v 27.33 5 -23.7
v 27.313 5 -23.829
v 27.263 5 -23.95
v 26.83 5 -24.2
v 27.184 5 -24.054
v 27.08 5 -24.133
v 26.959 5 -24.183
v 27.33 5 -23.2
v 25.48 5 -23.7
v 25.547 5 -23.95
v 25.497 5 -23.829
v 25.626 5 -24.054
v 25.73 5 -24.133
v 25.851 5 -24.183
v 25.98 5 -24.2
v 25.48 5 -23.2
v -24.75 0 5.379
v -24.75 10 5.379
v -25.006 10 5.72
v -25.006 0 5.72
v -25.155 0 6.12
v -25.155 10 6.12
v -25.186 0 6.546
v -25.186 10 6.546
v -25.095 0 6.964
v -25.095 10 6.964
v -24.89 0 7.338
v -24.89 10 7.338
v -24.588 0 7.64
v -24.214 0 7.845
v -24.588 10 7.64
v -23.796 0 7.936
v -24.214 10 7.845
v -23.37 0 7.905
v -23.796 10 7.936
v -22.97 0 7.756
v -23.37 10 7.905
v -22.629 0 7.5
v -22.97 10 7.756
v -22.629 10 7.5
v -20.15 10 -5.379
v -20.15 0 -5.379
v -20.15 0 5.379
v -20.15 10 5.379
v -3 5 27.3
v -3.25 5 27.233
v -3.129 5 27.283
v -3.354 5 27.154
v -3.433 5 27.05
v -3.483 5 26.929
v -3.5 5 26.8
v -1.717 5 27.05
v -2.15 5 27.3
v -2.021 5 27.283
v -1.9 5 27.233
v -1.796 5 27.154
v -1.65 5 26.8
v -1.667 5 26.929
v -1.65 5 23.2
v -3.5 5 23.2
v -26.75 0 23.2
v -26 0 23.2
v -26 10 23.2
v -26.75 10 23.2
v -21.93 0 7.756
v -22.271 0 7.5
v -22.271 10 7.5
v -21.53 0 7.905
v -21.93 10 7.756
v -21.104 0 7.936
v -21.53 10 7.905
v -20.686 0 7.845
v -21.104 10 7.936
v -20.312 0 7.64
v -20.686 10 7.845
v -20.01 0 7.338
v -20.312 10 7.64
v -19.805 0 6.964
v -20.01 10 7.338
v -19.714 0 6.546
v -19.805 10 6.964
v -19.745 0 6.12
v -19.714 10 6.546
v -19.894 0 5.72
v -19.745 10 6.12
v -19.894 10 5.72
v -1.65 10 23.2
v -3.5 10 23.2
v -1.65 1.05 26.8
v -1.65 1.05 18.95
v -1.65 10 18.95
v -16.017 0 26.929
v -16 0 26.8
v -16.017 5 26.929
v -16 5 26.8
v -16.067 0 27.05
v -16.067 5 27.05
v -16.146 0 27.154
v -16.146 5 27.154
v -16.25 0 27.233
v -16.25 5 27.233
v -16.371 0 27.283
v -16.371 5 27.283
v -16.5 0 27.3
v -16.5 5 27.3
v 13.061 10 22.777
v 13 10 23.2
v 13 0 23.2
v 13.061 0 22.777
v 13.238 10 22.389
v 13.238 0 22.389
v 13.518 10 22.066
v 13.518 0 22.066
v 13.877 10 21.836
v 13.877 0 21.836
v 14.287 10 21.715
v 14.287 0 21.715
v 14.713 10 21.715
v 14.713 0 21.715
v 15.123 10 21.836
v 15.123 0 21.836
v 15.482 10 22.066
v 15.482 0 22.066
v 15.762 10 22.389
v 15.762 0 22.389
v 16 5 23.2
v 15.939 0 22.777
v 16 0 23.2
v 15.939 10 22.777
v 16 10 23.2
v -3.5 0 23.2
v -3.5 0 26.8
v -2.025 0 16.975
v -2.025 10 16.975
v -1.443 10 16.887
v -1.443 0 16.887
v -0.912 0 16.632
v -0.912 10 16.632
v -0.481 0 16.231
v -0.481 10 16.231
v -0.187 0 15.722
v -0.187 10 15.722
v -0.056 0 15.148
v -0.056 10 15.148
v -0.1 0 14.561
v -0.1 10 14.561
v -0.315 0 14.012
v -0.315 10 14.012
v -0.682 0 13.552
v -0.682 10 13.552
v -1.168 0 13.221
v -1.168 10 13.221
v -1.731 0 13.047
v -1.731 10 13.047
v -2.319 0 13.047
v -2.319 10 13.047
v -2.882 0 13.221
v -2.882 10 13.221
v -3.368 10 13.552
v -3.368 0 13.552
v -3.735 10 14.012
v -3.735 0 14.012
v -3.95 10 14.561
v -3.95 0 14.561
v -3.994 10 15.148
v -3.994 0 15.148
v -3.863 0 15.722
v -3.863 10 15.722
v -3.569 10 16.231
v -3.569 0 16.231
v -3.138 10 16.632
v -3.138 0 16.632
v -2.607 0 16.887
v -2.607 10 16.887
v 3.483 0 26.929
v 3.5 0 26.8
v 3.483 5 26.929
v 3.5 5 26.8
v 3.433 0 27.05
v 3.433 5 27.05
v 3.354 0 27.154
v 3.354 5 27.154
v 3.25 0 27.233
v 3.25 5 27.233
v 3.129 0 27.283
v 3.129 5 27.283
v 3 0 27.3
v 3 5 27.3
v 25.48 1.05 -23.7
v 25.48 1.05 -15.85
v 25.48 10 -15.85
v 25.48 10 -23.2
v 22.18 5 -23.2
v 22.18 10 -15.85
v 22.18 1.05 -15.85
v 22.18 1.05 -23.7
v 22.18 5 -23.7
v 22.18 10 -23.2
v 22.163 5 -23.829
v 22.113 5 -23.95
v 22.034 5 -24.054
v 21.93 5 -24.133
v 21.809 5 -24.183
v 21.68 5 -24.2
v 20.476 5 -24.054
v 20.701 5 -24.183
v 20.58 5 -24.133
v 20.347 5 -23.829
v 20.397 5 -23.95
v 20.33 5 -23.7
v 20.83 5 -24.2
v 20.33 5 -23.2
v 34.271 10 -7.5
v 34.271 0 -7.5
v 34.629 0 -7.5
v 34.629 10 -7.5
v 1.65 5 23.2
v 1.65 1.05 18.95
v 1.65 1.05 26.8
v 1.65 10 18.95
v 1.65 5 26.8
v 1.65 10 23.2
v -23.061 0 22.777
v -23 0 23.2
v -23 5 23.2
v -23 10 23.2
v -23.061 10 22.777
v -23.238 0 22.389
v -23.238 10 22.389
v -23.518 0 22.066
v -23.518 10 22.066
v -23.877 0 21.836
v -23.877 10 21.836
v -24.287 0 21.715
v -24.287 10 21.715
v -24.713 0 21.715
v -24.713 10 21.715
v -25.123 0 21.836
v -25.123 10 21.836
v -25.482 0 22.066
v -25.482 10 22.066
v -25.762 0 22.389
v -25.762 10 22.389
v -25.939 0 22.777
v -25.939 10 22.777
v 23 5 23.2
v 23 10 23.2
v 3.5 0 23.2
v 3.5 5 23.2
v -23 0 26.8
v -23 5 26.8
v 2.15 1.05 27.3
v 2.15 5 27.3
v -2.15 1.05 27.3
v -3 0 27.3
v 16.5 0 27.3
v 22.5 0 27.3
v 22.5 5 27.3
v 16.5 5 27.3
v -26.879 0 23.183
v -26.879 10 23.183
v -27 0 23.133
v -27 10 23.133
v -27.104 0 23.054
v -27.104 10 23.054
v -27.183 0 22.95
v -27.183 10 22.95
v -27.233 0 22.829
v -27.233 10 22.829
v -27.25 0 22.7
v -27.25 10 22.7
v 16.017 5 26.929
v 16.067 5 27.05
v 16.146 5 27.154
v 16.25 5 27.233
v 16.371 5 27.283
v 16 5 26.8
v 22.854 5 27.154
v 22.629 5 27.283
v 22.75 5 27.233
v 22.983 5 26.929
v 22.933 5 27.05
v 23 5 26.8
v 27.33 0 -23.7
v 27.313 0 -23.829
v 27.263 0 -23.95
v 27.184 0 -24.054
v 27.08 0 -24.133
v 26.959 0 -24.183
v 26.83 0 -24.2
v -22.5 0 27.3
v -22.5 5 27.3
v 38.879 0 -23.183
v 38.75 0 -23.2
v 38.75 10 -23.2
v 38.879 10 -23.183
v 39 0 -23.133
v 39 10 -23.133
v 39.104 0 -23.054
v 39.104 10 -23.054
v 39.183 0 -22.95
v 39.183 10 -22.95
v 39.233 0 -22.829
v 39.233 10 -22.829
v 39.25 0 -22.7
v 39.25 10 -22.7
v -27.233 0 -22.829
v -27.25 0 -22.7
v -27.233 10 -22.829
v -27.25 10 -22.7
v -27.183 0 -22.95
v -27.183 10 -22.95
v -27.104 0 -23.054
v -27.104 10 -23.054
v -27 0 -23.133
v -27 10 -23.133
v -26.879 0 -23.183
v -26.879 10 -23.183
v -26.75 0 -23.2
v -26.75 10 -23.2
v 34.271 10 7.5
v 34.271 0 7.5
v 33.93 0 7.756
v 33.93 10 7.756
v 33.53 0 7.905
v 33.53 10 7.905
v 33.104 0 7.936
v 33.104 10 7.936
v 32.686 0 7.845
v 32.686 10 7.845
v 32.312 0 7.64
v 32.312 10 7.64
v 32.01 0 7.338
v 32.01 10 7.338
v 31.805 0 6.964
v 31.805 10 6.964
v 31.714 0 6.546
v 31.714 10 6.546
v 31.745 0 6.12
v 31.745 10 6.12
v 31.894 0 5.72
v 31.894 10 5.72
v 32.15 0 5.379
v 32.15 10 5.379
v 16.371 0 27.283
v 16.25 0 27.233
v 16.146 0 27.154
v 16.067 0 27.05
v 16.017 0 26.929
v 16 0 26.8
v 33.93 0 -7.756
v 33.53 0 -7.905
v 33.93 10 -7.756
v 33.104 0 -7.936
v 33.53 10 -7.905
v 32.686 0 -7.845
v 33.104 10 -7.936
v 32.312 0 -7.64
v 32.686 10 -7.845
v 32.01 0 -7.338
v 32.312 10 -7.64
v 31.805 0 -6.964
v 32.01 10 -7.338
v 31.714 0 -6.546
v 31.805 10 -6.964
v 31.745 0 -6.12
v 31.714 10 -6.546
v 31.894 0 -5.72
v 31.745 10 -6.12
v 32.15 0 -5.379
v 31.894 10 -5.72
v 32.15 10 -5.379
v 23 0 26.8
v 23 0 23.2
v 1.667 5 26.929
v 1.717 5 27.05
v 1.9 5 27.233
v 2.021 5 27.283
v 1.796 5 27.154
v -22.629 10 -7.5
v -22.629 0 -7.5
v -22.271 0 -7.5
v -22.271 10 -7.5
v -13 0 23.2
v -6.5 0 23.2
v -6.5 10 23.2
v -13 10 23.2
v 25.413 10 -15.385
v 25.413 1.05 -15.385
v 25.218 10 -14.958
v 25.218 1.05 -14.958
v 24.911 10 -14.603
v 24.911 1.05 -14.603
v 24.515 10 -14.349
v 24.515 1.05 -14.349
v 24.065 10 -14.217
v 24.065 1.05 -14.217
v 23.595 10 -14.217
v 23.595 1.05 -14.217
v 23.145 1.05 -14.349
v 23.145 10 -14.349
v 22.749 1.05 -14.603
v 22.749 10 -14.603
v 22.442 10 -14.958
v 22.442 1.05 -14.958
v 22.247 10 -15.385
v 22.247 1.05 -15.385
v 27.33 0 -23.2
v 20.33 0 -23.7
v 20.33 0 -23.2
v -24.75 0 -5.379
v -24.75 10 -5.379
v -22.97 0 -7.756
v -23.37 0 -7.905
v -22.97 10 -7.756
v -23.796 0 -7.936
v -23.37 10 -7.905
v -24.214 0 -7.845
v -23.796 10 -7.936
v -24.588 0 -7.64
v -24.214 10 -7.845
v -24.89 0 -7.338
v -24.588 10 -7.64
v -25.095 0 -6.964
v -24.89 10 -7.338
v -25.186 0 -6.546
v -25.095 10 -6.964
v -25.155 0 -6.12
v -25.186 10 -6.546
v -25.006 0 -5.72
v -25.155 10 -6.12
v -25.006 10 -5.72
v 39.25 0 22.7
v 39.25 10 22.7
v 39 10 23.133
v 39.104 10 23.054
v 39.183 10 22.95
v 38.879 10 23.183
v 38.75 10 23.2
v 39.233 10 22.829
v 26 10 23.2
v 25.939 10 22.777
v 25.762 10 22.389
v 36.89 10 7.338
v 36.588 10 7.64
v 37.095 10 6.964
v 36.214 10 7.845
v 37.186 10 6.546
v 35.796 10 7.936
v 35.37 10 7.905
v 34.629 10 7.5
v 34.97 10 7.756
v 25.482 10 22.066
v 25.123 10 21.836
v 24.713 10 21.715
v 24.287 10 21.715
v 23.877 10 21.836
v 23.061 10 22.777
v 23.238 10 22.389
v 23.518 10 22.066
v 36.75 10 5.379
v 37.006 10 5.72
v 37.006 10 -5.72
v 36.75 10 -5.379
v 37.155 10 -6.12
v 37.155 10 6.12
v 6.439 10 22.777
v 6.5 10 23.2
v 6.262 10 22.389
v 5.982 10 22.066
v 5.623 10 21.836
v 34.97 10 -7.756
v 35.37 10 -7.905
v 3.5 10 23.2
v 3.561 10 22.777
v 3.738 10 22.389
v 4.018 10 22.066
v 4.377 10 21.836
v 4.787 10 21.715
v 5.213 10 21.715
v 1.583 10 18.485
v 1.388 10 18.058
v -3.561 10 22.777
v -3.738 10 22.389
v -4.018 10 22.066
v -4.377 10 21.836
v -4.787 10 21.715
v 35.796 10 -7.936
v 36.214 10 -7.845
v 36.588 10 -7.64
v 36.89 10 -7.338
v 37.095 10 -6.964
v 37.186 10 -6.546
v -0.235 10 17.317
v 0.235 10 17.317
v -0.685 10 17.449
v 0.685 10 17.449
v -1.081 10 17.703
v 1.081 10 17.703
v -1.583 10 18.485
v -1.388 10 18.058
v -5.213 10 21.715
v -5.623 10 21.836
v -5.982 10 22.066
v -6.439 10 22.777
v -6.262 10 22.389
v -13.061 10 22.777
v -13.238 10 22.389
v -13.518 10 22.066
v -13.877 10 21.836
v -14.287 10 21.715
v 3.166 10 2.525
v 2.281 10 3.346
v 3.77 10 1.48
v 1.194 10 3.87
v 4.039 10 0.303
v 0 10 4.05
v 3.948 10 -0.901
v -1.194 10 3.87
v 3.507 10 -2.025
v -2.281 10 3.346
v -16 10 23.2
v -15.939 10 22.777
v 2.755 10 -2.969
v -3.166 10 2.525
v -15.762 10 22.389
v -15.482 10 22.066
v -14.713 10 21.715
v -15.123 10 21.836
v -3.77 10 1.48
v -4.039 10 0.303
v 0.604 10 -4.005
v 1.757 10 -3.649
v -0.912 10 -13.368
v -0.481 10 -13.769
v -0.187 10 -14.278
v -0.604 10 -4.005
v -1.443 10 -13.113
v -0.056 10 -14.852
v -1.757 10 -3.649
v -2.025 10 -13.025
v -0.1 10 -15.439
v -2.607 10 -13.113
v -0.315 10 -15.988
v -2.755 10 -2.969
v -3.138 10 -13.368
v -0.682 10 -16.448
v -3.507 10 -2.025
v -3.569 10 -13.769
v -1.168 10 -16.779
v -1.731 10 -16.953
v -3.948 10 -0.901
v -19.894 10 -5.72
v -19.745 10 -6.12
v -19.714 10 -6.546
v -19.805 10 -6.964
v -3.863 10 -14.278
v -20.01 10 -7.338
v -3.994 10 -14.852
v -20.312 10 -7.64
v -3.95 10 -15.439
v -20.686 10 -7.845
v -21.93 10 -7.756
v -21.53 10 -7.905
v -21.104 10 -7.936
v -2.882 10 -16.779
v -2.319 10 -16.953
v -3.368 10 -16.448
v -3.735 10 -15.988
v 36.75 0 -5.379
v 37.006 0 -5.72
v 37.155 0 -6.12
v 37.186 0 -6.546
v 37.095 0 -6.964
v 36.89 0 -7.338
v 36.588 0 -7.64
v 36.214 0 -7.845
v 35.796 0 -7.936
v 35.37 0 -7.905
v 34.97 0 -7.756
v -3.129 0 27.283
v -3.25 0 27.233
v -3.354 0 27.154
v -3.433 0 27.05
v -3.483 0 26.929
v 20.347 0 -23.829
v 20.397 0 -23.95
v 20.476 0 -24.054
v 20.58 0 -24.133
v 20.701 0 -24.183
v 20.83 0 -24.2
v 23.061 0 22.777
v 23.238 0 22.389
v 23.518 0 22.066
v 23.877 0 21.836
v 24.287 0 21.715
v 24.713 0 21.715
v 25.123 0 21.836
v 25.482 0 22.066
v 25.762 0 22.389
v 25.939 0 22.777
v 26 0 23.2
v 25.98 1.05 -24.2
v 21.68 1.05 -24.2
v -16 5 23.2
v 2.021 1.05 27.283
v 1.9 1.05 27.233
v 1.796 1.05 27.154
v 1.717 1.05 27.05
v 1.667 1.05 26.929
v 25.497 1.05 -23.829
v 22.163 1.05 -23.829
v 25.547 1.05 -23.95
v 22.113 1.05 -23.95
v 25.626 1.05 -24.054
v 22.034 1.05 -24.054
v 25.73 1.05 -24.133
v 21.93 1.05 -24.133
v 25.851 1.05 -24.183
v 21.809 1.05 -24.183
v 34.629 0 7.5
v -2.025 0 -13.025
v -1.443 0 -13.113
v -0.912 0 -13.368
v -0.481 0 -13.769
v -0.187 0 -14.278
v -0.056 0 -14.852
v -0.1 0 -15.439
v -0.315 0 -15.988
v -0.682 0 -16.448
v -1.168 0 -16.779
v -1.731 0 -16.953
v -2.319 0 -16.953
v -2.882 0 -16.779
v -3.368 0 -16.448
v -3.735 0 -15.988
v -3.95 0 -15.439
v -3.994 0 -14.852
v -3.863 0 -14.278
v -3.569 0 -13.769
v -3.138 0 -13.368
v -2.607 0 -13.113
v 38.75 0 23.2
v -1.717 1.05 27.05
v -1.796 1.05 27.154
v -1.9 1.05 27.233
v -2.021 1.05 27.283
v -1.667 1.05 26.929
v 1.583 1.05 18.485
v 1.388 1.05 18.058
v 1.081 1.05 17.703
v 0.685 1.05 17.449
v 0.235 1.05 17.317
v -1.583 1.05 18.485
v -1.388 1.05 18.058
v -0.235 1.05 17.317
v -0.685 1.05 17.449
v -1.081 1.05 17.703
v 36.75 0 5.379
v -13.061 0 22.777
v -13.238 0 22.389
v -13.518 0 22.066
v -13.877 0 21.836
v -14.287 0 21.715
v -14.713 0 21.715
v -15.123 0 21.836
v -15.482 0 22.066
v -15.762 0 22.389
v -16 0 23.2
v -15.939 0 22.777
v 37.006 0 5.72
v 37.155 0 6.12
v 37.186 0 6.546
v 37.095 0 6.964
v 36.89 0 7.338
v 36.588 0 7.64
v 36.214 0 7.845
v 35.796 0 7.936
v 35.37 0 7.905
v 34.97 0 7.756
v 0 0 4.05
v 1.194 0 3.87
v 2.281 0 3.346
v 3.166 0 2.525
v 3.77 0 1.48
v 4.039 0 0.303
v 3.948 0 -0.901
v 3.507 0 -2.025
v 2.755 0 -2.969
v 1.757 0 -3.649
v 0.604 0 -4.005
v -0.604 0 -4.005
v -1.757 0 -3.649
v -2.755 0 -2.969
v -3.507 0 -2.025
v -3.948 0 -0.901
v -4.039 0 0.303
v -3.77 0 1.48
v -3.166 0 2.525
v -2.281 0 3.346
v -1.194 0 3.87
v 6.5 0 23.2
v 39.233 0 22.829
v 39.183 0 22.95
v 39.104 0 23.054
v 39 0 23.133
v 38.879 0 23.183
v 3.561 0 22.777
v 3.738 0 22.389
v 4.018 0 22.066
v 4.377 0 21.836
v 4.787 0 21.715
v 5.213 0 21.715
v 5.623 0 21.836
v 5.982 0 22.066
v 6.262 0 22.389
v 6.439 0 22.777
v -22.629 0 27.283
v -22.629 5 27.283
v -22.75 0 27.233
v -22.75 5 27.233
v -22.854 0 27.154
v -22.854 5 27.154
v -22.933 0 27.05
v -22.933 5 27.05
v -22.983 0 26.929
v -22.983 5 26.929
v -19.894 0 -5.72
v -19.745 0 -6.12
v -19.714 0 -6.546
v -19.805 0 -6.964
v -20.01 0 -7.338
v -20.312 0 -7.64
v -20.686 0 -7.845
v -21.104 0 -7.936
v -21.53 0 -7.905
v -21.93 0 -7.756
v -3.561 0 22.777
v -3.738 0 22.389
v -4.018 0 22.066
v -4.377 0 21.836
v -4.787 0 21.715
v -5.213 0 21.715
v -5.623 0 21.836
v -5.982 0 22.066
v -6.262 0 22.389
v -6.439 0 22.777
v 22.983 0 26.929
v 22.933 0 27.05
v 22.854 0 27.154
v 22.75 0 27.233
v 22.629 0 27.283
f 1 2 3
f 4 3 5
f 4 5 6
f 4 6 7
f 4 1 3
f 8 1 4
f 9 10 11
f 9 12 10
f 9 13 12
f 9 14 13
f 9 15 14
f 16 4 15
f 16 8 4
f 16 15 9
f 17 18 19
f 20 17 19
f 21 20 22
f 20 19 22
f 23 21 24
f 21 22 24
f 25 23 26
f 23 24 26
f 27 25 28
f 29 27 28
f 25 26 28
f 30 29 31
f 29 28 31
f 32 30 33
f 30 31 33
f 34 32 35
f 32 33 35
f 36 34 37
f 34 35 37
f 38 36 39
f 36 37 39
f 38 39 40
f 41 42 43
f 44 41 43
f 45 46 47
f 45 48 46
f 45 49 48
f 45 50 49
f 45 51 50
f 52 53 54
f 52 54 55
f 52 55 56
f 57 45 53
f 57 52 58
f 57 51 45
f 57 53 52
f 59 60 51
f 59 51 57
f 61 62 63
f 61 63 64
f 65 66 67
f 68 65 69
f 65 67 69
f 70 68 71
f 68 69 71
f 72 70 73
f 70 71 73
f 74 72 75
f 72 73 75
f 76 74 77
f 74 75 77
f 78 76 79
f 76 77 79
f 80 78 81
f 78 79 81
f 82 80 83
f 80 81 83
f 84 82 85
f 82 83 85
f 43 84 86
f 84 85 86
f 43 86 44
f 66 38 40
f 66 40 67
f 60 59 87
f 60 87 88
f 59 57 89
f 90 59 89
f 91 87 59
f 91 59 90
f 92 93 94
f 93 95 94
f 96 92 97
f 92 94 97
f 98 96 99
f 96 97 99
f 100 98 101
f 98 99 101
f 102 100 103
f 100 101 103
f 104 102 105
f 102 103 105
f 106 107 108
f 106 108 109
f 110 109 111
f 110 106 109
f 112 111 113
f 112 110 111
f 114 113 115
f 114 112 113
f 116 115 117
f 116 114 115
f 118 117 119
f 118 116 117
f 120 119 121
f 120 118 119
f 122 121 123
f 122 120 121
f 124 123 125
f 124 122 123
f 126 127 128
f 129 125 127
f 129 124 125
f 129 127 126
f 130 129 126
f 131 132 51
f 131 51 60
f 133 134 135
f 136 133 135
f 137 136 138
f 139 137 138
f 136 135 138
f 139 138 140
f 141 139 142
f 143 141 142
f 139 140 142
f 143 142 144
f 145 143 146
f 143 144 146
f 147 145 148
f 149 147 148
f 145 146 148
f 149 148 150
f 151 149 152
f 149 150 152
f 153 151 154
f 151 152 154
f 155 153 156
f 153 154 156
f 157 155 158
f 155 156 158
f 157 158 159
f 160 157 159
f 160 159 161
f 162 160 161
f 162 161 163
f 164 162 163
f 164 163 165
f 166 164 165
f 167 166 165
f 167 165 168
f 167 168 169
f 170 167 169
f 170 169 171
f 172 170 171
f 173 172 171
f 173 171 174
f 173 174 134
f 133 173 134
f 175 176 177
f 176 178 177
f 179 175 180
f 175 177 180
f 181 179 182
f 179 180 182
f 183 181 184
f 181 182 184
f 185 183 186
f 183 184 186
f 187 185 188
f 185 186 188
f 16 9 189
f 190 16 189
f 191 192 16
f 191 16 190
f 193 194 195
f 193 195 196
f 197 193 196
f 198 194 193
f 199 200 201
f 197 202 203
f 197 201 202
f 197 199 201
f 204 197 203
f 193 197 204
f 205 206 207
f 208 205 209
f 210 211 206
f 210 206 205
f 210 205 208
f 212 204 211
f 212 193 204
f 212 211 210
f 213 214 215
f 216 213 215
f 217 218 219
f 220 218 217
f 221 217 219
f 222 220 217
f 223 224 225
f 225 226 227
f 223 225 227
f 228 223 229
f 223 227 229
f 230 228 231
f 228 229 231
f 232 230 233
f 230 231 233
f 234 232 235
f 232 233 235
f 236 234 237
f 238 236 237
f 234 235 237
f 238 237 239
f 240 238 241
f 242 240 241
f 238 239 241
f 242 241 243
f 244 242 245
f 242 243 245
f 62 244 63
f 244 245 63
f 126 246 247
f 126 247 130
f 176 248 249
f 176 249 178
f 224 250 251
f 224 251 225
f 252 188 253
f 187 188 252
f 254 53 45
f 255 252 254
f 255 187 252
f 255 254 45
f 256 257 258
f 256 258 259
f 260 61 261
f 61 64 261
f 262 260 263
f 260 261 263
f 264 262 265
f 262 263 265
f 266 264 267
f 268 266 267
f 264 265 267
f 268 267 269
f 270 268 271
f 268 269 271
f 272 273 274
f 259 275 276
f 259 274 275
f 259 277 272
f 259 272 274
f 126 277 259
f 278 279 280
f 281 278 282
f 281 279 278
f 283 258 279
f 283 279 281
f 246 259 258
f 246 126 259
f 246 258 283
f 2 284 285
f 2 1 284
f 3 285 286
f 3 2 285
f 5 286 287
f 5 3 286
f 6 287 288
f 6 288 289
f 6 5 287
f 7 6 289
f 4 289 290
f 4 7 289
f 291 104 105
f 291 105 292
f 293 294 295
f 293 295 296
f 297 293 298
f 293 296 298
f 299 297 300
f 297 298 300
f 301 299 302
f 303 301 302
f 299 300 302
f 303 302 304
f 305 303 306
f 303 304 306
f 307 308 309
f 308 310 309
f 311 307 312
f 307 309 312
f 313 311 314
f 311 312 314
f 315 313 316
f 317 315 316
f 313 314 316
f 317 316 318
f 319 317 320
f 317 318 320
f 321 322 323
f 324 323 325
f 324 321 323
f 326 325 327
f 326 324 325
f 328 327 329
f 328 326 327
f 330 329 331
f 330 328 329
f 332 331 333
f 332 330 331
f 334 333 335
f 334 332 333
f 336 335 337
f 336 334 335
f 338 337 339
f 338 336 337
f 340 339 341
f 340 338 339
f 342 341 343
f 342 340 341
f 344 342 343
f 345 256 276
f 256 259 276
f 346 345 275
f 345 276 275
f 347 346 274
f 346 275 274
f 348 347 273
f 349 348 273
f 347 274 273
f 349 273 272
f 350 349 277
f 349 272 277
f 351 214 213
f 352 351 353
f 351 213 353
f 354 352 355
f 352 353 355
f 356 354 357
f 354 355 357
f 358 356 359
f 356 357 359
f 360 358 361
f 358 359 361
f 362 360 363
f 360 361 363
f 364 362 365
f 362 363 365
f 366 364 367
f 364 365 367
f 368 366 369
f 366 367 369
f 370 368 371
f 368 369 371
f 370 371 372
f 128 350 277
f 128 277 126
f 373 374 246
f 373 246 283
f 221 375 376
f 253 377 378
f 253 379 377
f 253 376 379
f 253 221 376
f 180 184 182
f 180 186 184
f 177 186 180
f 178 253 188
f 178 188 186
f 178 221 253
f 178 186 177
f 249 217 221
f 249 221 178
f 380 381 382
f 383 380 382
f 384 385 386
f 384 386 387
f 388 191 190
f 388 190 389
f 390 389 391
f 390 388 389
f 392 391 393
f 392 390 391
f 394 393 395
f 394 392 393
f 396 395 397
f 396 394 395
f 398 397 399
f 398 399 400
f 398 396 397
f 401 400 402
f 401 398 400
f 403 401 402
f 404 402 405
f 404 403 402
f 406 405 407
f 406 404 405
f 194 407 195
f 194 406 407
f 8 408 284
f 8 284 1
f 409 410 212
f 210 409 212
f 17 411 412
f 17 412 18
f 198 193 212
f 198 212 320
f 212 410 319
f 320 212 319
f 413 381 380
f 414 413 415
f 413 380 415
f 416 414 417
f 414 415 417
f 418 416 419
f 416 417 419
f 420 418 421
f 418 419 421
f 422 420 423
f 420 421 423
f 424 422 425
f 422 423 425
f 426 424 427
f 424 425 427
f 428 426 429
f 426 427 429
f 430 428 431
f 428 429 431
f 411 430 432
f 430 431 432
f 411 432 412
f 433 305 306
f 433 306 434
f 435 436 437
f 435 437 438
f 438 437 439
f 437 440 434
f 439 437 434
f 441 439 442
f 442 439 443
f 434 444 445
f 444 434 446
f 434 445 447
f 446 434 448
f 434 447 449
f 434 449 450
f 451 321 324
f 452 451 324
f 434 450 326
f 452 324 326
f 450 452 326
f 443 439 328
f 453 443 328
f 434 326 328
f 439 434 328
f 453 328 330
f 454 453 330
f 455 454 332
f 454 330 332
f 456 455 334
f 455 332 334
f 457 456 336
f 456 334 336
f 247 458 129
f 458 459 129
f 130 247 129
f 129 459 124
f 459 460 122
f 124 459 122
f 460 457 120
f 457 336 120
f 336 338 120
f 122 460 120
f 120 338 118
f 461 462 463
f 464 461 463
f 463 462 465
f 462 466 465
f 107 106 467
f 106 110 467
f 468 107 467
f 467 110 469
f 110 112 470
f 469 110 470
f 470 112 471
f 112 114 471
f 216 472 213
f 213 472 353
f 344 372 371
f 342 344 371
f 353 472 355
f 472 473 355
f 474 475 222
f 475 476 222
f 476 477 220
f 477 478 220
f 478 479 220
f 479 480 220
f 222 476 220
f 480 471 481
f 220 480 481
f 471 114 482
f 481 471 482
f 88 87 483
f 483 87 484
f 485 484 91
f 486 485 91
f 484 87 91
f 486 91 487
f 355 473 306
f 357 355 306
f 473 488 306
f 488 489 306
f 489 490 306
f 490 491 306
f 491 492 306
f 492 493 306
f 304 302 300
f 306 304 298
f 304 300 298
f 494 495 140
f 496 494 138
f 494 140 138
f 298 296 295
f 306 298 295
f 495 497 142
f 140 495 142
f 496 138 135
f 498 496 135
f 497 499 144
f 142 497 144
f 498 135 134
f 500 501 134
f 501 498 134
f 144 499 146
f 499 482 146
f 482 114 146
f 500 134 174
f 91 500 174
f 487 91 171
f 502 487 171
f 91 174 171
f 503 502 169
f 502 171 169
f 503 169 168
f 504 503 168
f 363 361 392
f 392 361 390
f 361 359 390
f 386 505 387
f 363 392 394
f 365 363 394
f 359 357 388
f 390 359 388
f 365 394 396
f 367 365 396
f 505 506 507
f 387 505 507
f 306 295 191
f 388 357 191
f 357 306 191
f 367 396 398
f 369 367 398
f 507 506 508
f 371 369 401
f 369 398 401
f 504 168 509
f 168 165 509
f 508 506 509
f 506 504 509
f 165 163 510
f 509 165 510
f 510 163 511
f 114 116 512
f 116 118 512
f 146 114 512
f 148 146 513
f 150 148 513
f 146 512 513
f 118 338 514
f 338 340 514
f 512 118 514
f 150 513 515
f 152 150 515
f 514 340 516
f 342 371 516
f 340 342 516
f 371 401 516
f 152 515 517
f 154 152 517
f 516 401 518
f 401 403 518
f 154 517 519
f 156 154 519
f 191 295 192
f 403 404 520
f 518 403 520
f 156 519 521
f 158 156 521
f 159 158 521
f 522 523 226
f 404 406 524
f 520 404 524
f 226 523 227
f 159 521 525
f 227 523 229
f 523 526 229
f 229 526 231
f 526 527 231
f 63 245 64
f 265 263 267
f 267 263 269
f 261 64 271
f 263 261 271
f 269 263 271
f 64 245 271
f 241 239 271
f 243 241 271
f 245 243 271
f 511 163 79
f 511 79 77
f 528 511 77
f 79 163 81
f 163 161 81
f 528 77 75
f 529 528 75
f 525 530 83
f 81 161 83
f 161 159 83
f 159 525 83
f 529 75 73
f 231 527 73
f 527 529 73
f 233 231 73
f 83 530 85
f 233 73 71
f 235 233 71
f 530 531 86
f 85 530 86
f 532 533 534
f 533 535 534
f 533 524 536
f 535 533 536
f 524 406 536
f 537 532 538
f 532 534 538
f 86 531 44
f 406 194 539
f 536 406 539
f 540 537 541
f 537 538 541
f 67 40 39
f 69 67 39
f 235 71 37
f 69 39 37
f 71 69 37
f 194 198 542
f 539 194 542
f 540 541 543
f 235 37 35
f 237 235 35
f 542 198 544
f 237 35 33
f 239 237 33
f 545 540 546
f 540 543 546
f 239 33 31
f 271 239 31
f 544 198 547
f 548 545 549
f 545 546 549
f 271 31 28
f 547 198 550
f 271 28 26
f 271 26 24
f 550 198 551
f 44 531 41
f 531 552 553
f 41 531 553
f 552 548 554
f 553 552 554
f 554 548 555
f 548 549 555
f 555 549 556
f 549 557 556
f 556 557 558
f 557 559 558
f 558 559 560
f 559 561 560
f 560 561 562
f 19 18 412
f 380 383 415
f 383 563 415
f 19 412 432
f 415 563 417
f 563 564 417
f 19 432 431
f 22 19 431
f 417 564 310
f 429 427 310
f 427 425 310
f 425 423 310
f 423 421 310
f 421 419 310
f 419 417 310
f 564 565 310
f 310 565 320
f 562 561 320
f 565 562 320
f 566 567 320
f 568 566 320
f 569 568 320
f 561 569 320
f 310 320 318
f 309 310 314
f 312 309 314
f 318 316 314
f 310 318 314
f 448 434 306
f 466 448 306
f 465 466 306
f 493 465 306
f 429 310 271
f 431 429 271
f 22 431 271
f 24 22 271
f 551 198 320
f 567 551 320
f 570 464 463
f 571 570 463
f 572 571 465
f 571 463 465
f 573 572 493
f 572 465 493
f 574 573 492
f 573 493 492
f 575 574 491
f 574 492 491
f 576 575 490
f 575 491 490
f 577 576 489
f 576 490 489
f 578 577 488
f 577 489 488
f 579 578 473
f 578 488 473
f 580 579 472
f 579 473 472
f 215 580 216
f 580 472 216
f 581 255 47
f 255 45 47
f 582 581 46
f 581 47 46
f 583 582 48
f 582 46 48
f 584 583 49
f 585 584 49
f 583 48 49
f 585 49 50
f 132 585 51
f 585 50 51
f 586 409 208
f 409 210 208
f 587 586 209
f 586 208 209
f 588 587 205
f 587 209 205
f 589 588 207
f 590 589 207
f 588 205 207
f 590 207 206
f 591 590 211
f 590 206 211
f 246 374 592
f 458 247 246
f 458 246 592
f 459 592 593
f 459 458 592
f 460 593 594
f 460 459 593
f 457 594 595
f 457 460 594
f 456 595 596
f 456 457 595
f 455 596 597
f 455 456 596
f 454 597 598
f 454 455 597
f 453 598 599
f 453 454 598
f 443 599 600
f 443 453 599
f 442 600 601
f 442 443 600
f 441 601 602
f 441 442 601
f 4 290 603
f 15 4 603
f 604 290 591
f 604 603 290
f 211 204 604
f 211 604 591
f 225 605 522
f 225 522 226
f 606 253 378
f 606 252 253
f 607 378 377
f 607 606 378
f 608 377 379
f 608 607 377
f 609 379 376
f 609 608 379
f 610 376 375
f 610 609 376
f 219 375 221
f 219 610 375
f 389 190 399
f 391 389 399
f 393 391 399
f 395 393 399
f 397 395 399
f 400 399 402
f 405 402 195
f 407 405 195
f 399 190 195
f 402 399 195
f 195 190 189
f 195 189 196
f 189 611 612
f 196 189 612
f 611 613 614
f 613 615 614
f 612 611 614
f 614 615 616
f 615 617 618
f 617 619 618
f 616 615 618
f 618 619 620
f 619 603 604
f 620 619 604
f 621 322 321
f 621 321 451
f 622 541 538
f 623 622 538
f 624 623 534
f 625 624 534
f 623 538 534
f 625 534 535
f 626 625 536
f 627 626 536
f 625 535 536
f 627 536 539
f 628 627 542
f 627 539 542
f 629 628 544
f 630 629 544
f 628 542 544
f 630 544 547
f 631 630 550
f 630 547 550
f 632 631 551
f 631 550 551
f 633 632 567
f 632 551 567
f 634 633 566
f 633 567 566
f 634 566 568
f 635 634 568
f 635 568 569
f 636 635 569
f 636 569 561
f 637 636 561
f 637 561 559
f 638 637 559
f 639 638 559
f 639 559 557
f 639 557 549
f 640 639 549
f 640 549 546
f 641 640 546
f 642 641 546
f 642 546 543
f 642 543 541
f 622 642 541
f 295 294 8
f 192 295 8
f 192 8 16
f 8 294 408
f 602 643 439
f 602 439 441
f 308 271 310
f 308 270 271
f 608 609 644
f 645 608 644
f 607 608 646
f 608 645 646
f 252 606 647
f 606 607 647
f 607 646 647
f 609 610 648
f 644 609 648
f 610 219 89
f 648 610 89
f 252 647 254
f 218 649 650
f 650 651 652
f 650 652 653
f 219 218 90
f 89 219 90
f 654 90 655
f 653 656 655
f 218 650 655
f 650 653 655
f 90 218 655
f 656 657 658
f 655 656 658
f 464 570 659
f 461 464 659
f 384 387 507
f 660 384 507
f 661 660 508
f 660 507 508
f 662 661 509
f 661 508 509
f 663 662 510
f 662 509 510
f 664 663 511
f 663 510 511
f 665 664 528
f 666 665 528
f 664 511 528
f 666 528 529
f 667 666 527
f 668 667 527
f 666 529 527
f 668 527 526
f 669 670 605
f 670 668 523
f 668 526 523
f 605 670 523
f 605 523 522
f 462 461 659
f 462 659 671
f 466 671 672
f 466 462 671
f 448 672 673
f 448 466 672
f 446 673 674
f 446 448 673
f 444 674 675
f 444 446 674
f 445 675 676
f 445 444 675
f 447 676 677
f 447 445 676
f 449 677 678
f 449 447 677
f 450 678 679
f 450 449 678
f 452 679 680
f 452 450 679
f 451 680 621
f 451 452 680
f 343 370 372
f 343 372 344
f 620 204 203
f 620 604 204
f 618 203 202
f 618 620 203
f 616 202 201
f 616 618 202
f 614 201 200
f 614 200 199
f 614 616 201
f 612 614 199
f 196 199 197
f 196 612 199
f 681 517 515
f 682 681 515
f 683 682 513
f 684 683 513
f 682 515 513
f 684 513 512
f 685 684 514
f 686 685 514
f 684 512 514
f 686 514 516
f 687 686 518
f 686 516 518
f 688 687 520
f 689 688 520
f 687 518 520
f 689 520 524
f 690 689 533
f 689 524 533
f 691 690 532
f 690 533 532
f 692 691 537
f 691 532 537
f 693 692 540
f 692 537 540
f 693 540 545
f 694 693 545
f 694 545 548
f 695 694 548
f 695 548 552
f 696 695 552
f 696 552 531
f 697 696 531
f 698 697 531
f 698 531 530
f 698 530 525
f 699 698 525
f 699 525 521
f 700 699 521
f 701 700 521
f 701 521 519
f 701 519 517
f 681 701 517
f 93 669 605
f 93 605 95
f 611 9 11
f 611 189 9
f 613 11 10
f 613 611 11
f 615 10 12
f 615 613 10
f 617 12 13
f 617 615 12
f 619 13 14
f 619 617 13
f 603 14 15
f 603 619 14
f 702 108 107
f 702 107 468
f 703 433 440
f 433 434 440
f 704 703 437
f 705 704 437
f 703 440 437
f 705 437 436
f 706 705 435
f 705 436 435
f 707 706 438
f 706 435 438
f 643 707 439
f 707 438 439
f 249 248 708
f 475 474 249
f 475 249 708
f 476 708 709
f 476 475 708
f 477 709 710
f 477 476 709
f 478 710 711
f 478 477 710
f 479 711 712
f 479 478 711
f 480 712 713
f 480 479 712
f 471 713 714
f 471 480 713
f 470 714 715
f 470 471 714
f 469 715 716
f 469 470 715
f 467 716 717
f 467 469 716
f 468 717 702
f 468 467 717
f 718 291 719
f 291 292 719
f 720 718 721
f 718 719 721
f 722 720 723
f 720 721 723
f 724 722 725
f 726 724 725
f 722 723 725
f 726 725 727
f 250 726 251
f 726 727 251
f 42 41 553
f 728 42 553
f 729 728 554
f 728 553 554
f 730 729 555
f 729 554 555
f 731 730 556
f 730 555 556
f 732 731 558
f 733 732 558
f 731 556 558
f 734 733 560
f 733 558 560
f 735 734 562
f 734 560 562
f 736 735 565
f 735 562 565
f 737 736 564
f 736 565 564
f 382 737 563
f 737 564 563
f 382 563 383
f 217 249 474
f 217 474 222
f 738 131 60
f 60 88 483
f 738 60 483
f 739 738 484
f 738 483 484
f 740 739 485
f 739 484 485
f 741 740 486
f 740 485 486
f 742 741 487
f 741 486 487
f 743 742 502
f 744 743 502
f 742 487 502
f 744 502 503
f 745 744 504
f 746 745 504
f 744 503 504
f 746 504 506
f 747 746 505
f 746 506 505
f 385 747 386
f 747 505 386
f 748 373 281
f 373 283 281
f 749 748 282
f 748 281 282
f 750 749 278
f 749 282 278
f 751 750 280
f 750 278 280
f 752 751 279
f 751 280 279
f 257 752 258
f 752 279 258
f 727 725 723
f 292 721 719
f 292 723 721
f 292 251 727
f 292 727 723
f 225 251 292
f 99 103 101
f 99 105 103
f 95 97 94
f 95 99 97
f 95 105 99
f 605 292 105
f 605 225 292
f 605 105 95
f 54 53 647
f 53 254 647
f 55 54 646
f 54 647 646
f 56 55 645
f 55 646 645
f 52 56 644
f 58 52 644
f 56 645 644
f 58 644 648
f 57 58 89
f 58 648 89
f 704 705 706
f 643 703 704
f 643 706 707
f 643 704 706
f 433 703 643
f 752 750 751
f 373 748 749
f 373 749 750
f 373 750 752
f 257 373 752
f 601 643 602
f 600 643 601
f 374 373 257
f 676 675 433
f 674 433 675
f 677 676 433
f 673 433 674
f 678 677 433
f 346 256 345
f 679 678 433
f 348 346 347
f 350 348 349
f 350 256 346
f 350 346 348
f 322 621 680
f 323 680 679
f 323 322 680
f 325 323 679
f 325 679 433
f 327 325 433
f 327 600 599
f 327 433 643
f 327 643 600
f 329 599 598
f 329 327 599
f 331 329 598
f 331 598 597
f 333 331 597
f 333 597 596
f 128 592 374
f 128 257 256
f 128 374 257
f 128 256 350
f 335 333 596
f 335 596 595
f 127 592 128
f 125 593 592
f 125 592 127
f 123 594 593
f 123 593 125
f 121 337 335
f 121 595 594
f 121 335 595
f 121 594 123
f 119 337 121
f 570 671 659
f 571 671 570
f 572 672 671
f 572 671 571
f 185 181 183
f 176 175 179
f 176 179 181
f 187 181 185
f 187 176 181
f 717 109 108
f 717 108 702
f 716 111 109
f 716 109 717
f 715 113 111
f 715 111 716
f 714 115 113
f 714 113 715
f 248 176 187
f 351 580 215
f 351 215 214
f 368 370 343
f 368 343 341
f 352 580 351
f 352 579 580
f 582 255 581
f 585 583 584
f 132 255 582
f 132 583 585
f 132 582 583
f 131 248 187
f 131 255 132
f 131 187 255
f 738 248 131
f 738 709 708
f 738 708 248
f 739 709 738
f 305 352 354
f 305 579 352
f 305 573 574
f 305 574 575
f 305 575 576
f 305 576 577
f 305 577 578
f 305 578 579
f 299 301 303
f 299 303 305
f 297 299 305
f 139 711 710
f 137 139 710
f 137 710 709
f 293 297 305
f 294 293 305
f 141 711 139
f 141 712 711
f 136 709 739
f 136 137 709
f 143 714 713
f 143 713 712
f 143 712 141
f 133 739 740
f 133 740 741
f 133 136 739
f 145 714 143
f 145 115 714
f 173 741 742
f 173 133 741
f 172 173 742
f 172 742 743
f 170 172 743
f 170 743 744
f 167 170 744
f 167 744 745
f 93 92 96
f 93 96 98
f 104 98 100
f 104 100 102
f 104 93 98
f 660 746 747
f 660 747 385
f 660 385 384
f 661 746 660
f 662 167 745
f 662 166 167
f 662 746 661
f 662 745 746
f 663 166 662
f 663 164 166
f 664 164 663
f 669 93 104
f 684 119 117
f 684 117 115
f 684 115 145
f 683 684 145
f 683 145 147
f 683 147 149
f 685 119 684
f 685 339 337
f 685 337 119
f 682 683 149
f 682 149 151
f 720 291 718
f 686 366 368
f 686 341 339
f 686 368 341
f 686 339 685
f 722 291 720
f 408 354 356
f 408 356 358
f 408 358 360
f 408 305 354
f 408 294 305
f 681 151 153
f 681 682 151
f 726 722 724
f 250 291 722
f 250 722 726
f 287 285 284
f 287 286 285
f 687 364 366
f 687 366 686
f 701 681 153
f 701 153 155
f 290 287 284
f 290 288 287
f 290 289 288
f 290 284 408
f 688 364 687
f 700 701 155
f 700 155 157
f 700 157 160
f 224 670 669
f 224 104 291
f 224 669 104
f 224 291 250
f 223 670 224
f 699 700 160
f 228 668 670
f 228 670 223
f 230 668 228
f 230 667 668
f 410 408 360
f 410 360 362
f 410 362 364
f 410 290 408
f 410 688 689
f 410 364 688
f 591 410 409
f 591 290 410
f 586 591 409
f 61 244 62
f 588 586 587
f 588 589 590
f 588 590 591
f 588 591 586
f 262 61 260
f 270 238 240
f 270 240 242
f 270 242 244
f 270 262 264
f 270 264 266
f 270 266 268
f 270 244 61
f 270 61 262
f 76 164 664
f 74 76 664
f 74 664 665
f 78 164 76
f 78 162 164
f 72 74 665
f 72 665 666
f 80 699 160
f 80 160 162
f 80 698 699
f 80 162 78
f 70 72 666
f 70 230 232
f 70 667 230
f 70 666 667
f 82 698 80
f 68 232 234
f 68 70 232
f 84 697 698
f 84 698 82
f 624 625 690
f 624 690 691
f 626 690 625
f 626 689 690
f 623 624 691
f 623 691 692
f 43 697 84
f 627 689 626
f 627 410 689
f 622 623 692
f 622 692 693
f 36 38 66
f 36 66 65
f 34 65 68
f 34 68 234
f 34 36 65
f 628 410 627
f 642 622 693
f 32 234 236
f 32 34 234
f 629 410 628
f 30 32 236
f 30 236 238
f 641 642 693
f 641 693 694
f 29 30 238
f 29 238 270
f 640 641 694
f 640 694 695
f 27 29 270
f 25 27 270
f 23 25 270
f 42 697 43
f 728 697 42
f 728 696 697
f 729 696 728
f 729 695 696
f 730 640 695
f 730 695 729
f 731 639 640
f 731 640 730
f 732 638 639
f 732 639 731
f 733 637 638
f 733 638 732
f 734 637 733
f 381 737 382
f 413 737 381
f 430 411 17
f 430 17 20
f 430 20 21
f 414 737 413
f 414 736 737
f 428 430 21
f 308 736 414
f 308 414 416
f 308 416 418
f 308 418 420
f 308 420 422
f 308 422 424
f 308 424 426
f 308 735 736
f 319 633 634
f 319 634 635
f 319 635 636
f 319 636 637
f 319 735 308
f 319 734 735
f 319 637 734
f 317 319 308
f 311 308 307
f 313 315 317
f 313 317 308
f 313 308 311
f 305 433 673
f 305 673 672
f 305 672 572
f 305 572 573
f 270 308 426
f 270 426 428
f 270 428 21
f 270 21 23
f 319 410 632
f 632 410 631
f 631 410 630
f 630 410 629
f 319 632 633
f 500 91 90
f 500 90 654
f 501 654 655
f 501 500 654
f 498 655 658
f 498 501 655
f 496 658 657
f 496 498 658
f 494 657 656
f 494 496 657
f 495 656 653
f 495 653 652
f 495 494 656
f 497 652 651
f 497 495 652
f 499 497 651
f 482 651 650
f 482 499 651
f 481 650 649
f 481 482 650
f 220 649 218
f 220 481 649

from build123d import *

# Parameters (mm, degrees)
BOSS_EXTRUDE1_DEPTH = 10
SKETCH2_R           = 4.05
SKETCH2_R_2         = 1.975
CUT_EXTRUDE1_DEPTH  = 49.845189118
SKETCH14_W          = 50.25
SKETCH14_H          = 4.1
CUT_EXTRUDE13_DEPTH = 5
SKETCH16_W          = 4.6
SKETCH16_H          = 15
CUT_EXTRUDE15_DEPTH = 10
CUT_EXTRUDE14_DEPTH = 49.845189118
SKETCH19_W          = 7
SKETCH19_H          = 5
BOSS_EXTRUDE2_DEPTH = 1
CUT_EXTRUDE16_DEPTH = 8.95
FILLET1_R           = 0.5


with BuildPart() as part:
    # Sketch1 → Boss-Extrude1 (new body)
    with BuildSketch(Plane(origin=(0, 0, 0), x_dir=(1, 0, 0), z_dir=(0, 1, 0))):
        Polygon((-23, 23.2), (23, 23.2), (39.25, 23.2), (39.25, -23.2), (23, -23.2), (23, -27.3), (16, -27.3), (16, -23.2), (3.5, -23.2), (3.5, -27.3), (-3.5, -27.3), (-3.5, -23.2), (-16, -23.2), (-16, -27.3), (-23, -27.3), (-23, -23.2), (-27.25, -23.2), (-27.25, 23.2), align=None)
    extrude(amount=BOSS_EXTRUDE1_DEPTH)

    # Sketch2 → Cut-Extrude1 (cut, through all)
    with BuildSketch(Plane(origin=(0, 10, 0), x_dir=(1, 0, 0), z_dir=(0, 1, 0))):
        with Locations(Location((0, 0, 0), (0, 0, 270))):
            Circle(SKETCH2_R)
        with Locations(Location((-2.025, 15, 0), (0, 0, 270))):
            Circle(SKETCH2_R_2)
        with Locations(Location((-2.025, -15, 0), (0, 0, 270))):
            Circle(SKETCH2_R_2)
    extrude(amount=-CUT_EXTRUDE1_DEPTH, mode=Mode.SUBTRACT)

    # Sketch14 → Cut-Extrude13 (cut)
    with BuildSketch(Plane(origin=(0, 10, 0), x_dir=(1, 0, 0), z_dir=(0, 1, 0))):
        with Locations((-2.125, -25.25)):
            Rectangle(SKETCH14_W, SKETCH14_H)
    extrude(amount=-CUT_EXTRUDE13_DEPTH, mode=Mode.SUBTRACT)

    # Sketch16 → Cut-Extrude15 (cut)
    with BuildSketch(Plane.XZ):
        with Locations((34.45, 0)):
            Rectangle(SKETCH16_W, SKETCH16_H)
        with Locations((-22.45, 0)):
            Rectangle(SKETCH16_W, SKETCH16_H)
    extrude(amount=-CUT_EXTRUDE15_DEPTH, mode=Mode.SUBTRACT)

    # Sketch15 → Cut-Extrude14 (cut, through all)
    with BuildSketch(Plane(origin=(0, 10, 0), x_dir=(1, 0, 0), z_dir=(0, 1, 0))):
        with BuildLine():
            Line((13, -27.3), (13, -23.2))
            ThreePointArc((13, -23.2), (14.5, -21.7), (16, -23.2))
            Line((16, -23.2), (16, -27.3))
            ThreePointArc((16, -27.3), (14.5, -28.8), (13, -27.3))
        make_face()
        with BuildLine():
            Line((3.5, -27.3), (3.5, -23.2))
            ThreePointArc((3.5, -23.2), (5, -21.7), (6.5, -23.2))
            Line((6.5, -23.2), (6.5, -27.3))
            ThreePointArc((6.5, -27.3), (5, -28.8), (3.5, -27.3))
        make_face()
        with BuildLine():
            Line((-13, -27.3), (-13, -23.2))
            ThreePointArc((-13, -23.2), (-14.5, -21.7), (-16, -23.2))
            Line((-16, -23.2), (-16, -27.3))
            ThreePointArc((-16, -27.3), (-14.5, -28.8), (-13, -27.3))
        make_face()
        with BuildLine():
            Line((-3.5, -27.3), (-3.5, -23.2))
            ThreePointArc((-3.5, -23.2), (-5, -21.7), (-6.5, -23.2))
            Line((-6.5, -23.2), (-6.5, -27.3))
            ThreePointArc((-6.5, -27.3), (-5, -28.8), (-3.5, -27.3))
        make_face()
        with BuildLine():
            Line((23, -27.3), (23, -23.2))
            ThreePointArc((23, -23.2), (24.5, -21.7), (26, -23.2))
            Line((26, -23.2), (26, -27.3))
            ThreePointArc((26, -27.3), (24.5, -28.8), (23, -27.3))
        make_face()
        with BuildLine():
            Line((-23, -27.3), (-23, -23.2))
            ThreePointArc((-23, -23.2), (-24.5, -21.7), (-26, -23.2))
            Line((-26, -23.2), (-26, -27.3))
            ThreePointArc((-26, -27.3), (-24.5, -28.8), (-23, -27.3))
        make_face()
        with BuildLine():
            ThreePointArc((34.45, 7.284346805), (31.710660172, 6.439339828), (34.45, 5.594332852))
            ThreePointArc((34.45, 5.594332852), (37.189339828, 6.439339828), (34.45, 7.284346805))
        make_face()
        with BuildLine():
            ThreePointArc((34.45, -7.284346805), (31.710660172, -6.439339828), (34.45, -5.594332852))
            ThreePointArc((34.45, -5.594332852), (37.189339828, -6.439339828), (34.45, -7.284346805))
        make_face()
        with BuildLine():
            ThreePointArc((-22.45, -7.284346805), (-19.710660172, -6.439339828), (-22.45, -5.594332852))
            ThreePointArc((-22.45, -5.594332852), (-25.189339828, -6.439339828), (-22.45, -7.284346805))
        make_face()
        with BuildLine():
            ThreePointArc((-22.45, 7.284346805), (-25.189339828, 6.439339828), (-22.45, 5.594332852))
            ThreePointArc((-22.45, 5.594332852), (-19.710660172, 6.439339828), (-22.45, 7.284346805))
        make_face()
    extrude(amount=-CUT_EXTRUDE14_DEPTH, mode=Mode.SUBTRACT)

    # Sketch19 → Boss-Extrude2 (add)
    with BuildSketch(Plane(origin=(0, 0, -23.2), x_dir=(-1, 0, 0), z_dir=(0, 0, -1))):
        with Locations((-23.83, 2.5)):
            Rectangle(SKETCH19_W, SKETCH19_H)
    extrude(amount=BOSS_EXTRUDE2_DEPTH)

    # Sketch17 → Cut-Extrude16 (cut)
    with BuildSketch(Plane(origin=(0, 10, 0), x_dir=(1, 0, 0), z_dir=(0, 1, 0))):
        with BuildLine():
            Line((25.48, 24.2), (25.48, 15.85))
            ThreePointArc((25.48, 15.85), (23.83, 14.2), (22.18, 15.85))
            Line((22.18, 15.85), (22.18, 24.2))
            ThreePointArc((22.18, 24.2), (23.83, 25.85), (25.48, 24.2))
        make_face()
        with BuildLine():
            Line((1.65, -18.95), (1.65, -27.3))
            ThreePointArc((1.65, -27.3), (0, -28.95), (-1.65, -27.3))
            Line((-1.65, -27.3), (-1.65, -18.95))
            ThreePointArc((-1.65, -18.95), (0, -17.3), (1.65, -18.95))
        make_face()
    extrude(amount=-CUT_EXTRUDE16_DEPTH, mode=Mode.SUBTRACT)

    # Fillet1
    fillet1_edges = [part.edges().sort_by_distance(p)[0] for p in [
        (-27.25, 5, 23.2),
        (-27.25, 5, -23.2),
        (39.25, 5, -23.2),
        (39.25, 5, 23.2),
        (20.33, 2.5, -24.2),
        (27.33, 2.5, -24.2),
        (25.48, 3.025, -24.2),
        (22.18, 3.025, -24.2),
        (-1.65, 3.025, 27.3),
        (1.65, 3.025, 27.3),
        (-16, 2.5, 27.3),
        (-23, 2.5, 27.3),
        (23, 2.5, 27.3),
        (16, 2.5, 27.3),
        (3.5, 2.5, 27.3),
        (-3.5, 2.5, 27.3),
    ]]
    fillet(fillet1_edges, radius=FILLET1_R)


solid = part.part
